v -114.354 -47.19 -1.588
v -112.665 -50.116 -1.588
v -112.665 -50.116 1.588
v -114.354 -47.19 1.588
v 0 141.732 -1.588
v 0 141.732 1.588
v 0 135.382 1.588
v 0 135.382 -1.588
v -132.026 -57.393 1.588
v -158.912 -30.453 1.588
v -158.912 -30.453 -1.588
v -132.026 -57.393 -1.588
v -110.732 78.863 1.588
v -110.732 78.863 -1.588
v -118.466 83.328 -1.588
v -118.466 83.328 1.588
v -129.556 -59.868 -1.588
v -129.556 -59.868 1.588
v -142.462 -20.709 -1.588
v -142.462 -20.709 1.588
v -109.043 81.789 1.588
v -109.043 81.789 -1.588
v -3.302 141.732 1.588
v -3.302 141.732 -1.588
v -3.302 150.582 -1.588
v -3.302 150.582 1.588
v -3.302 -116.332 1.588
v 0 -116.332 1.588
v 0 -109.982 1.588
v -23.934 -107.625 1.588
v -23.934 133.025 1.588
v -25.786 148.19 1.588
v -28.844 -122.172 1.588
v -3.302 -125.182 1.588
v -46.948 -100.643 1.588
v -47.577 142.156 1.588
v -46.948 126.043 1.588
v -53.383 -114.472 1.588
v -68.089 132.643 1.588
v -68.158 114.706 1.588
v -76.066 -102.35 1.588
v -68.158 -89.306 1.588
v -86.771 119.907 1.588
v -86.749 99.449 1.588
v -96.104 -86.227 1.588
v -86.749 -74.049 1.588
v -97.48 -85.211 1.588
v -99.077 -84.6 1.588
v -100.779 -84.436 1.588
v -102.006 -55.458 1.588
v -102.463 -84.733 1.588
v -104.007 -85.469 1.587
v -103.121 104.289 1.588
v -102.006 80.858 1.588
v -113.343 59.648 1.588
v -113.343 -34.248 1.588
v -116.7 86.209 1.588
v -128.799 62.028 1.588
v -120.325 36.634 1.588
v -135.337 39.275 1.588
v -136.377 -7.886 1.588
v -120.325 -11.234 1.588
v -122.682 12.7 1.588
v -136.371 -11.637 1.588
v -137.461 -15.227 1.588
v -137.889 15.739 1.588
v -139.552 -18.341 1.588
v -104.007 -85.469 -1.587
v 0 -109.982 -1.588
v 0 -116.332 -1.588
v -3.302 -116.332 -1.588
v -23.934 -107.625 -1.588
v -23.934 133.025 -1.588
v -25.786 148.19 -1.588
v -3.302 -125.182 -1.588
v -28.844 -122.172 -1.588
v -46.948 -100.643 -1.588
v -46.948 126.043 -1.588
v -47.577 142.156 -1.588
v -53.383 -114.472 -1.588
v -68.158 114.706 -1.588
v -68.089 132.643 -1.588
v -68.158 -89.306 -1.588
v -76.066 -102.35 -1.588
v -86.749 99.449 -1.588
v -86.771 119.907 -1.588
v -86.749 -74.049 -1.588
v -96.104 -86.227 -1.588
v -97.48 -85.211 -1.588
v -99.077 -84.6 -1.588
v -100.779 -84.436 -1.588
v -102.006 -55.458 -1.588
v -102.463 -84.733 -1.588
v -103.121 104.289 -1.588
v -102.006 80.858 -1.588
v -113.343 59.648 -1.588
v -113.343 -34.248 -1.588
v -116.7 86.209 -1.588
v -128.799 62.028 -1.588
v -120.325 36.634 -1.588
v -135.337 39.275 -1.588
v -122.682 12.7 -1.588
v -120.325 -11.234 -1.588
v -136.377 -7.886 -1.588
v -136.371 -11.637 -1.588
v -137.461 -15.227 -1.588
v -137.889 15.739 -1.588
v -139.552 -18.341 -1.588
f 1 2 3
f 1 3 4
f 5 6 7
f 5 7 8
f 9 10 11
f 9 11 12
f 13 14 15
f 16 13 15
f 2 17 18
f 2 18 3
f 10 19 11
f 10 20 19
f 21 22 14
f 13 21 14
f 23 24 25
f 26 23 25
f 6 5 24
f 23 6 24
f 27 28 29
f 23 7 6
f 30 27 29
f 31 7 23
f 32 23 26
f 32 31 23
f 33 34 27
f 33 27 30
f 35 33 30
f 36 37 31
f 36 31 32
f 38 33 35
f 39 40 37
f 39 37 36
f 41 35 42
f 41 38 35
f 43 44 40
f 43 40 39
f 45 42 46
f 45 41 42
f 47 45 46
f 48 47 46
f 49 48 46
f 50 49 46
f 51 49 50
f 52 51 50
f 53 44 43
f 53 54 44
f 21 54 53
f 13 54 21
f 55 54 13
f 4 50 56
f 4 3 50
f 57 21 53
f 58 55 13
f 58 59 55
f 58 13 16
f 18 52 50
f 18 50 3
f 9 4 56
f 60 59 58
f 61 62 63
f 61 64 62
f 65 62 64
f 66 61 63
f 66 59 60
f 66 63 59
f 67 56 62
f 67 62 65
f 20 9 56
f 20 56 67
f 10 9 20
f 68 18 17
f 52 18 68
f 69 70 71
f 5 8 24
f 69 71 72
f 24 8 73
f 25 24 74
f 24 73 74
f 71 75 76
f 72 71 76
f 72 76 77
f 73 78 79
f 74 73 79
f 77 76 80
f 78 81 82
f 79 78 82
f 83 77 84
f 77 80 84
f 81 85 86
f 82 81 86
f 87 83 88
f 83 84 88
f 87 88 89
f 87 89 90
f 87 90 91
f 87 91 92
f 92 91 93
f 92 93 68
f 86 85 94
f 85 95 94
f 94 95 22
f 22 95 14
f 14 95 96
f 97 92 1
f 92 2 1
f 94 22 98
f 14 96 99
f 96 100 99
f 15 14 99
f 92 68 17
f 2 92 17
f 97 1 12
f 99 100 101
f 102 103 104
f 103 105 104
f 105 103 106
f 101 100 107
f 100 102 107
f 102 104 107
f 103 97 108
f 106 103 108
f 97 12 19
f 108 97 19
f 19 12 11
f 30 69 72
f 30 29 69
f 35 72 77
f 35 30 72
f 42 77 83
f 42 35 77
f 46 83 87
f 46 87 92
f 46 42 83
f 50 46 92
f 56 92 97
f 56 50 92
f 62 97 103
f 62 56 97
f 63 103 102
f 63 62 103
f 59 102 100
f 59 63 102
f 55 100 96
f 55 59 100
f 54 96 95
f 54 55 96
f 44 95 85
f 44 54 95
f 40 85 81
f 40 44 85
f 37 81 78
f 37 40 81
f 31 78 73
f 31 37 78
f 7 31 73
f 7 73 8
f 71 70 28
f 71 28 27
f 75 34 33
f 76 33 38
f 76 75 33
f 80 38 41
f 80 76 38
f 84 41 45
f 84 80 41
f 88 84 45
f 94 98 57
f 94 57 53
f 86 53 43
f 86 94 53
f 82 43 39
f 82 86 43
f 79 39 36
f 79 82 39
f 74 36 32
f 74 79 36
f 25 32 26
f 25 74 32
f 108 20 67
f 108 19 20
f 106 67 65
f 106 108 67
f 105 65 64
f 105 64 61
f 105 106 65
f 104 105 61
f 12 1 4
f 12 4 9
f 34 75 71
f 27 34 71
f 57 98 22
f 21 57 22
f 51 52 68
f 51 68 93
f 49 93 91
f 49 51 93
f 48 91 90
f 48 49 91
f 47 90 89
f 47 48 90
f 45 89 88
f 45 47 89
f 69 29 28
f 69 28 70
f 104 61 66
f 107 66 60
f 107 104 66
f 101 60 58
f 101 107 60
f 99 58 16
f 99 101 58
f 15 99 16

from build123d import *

# Parameters (mm, degrees)
SKETCH2_R           = 137.922
SKETCH2_R_2         = 122.682
BOSS_EXTRUDE2_DEPTH = 1.5875
SKETCH3_W           = 290.977734258
SKETCH3_H           = 504.828840158
CUT_EXTRUDE1_DEPTH  = 205.235122161
BOSS_EXTRUDE3_DEPTH = 1.5875
FILLET2_R           = 6.35
FILLET3_R           = 12.7
SKETCH5_W           = 3.302
SKETCH5_H           = 10.16
SKETCH5_H_2         = 10.320651629
CUT_EXTRUDE2_DEPTH  = 219.975089365


with BuildPart() as part:
    # Sketch2 → Boss-Extrude2 (new, symmetric)
    with BuildSketch(Plane(origin=(248.273568551, -245.01347209, 0), x_dir=(0, -1, 0), z_dir=(0, 0, -1))):
        with Locations(Location((-257.71347209, 248.273568551, 0), (0, 0, 180))):
            Circle(SKETCH2_R)
        with Locations(Location((-257.71347209, 248.273568551, 0), (0, 0, 180))):
            Circle(SKETCH2_R_2, mode=Mode.SUBTRACT)
    extrude(amount=BOSS_EXTRUDE2_DEPTH, both=True)

    # Sketch3 → Cut-Extrude1 (cut, through all)
    with BuildSketch(Plane(origin=(0, 0, 0), x_dir=(0, 0, -1), z_dir=(1, 0, 0))):
        with Locations((4.206907001, 10.947122083)):
            Rectangle(SKETCH3_W, SKETCH3_H)
    extrude(amount=CUT_EXTRUDE1_DEPTH, mode=Mode.SUBTRACT)

    # Sketch4 → Boss-Extrude3 (add, symmetric)
    with BuildSketch(Plane.XY):
        with BuildLine():
            Line((-158.91199531, -30.452559211), (-104.007060596, -85.469026207))
            ThreePointArc((-104.007060596, -85.469026207), (-101.940396796, -83.943553525), (-99.869204781, -82.424234664))
            ThreePointArc((-99.869204781, -82.424234664), (-121.945025923, -51.735150773), (-134.859098706, -16.205044198))
            Line((-134.859098706, -16.205044198), (-158.91199531, -30.452559211))
        make_face()
    extrude(amount=BOSS_EXTRUDE3_DEPTH, both=True)

    # Fillet2
    # the kernel refuses this fillet: 6.35 mm, written as the material it adds along each edge
    with BuildSketch(Plane(origin=(-99.869204781, -82.424234664, 1.5875), x_dir=(0.7036137196097393, -0.7105826718805821, 0), z_dir=(0, 0, -1))) as fillet2_piece_1:
        with BuildLine():
            CenterArc((5.474610705, 6.348804924), FILLET2_R, 191.50159108, 77.386791497)
            Line((-0.747876011, 5.082645744), (-0.872325745, 5.057322561))
            ThreePointArc((-0.872325745, 5.057322561), (-0.503364548, 2.522278655), (-0.12559154, -0.018861738))
            Line((-0.12559154, -0.018861738), (0.002463821, -0.126976098))
            ThreePointArc((0.002463821, -0.126976098), (2.675709823, -0.101042949), (5.348955824, -0.126976098))
            Line((5.348955824, -0.126976098), (5.351419645, 0))
        make_face()
    extrude(amount=3.175)

    # Fillet3
    fillet3_edges = [part.edges().sort_by_distance(p)[0] for p in [
        (-134.859098706, -16.205044198, 0),
    ]]
    fillet(fillet3_edges, radius=FILLET3_R)

    # Sketch5 → Cut-Extrude2 (cut, through all)
    with BuildSketch(Plane(origin=(0, 0, -1.5875), x_dir=(-1, 0, 0), z_dir=(0, 0, -1))):
        with Locations((1.651, 146.812)):
            Rectangle(SKETCH5_W, SKETCH5_H)
        Polygon((109.043255392, 81.788598611), (110.732355392, 78.862991592), (120.034009933, 84.233304346), (118.344909933, 87.158911365), align=None)
        with Locations((1.651, -121.492325815)):
            Rectangle(SKETCH5_W, SKETCH5_H_2)
        Polygon((112.665009205, -50.115536994), (114.354109205, -47.189929975), (136.351154461, -59.889929975), (134.662054461, -62.815536994), align=None)
    extrude(amount=-CUT_EXTRUDE2_DEPTH, mode=Mode.SUBTRACT)


solid = part.part
